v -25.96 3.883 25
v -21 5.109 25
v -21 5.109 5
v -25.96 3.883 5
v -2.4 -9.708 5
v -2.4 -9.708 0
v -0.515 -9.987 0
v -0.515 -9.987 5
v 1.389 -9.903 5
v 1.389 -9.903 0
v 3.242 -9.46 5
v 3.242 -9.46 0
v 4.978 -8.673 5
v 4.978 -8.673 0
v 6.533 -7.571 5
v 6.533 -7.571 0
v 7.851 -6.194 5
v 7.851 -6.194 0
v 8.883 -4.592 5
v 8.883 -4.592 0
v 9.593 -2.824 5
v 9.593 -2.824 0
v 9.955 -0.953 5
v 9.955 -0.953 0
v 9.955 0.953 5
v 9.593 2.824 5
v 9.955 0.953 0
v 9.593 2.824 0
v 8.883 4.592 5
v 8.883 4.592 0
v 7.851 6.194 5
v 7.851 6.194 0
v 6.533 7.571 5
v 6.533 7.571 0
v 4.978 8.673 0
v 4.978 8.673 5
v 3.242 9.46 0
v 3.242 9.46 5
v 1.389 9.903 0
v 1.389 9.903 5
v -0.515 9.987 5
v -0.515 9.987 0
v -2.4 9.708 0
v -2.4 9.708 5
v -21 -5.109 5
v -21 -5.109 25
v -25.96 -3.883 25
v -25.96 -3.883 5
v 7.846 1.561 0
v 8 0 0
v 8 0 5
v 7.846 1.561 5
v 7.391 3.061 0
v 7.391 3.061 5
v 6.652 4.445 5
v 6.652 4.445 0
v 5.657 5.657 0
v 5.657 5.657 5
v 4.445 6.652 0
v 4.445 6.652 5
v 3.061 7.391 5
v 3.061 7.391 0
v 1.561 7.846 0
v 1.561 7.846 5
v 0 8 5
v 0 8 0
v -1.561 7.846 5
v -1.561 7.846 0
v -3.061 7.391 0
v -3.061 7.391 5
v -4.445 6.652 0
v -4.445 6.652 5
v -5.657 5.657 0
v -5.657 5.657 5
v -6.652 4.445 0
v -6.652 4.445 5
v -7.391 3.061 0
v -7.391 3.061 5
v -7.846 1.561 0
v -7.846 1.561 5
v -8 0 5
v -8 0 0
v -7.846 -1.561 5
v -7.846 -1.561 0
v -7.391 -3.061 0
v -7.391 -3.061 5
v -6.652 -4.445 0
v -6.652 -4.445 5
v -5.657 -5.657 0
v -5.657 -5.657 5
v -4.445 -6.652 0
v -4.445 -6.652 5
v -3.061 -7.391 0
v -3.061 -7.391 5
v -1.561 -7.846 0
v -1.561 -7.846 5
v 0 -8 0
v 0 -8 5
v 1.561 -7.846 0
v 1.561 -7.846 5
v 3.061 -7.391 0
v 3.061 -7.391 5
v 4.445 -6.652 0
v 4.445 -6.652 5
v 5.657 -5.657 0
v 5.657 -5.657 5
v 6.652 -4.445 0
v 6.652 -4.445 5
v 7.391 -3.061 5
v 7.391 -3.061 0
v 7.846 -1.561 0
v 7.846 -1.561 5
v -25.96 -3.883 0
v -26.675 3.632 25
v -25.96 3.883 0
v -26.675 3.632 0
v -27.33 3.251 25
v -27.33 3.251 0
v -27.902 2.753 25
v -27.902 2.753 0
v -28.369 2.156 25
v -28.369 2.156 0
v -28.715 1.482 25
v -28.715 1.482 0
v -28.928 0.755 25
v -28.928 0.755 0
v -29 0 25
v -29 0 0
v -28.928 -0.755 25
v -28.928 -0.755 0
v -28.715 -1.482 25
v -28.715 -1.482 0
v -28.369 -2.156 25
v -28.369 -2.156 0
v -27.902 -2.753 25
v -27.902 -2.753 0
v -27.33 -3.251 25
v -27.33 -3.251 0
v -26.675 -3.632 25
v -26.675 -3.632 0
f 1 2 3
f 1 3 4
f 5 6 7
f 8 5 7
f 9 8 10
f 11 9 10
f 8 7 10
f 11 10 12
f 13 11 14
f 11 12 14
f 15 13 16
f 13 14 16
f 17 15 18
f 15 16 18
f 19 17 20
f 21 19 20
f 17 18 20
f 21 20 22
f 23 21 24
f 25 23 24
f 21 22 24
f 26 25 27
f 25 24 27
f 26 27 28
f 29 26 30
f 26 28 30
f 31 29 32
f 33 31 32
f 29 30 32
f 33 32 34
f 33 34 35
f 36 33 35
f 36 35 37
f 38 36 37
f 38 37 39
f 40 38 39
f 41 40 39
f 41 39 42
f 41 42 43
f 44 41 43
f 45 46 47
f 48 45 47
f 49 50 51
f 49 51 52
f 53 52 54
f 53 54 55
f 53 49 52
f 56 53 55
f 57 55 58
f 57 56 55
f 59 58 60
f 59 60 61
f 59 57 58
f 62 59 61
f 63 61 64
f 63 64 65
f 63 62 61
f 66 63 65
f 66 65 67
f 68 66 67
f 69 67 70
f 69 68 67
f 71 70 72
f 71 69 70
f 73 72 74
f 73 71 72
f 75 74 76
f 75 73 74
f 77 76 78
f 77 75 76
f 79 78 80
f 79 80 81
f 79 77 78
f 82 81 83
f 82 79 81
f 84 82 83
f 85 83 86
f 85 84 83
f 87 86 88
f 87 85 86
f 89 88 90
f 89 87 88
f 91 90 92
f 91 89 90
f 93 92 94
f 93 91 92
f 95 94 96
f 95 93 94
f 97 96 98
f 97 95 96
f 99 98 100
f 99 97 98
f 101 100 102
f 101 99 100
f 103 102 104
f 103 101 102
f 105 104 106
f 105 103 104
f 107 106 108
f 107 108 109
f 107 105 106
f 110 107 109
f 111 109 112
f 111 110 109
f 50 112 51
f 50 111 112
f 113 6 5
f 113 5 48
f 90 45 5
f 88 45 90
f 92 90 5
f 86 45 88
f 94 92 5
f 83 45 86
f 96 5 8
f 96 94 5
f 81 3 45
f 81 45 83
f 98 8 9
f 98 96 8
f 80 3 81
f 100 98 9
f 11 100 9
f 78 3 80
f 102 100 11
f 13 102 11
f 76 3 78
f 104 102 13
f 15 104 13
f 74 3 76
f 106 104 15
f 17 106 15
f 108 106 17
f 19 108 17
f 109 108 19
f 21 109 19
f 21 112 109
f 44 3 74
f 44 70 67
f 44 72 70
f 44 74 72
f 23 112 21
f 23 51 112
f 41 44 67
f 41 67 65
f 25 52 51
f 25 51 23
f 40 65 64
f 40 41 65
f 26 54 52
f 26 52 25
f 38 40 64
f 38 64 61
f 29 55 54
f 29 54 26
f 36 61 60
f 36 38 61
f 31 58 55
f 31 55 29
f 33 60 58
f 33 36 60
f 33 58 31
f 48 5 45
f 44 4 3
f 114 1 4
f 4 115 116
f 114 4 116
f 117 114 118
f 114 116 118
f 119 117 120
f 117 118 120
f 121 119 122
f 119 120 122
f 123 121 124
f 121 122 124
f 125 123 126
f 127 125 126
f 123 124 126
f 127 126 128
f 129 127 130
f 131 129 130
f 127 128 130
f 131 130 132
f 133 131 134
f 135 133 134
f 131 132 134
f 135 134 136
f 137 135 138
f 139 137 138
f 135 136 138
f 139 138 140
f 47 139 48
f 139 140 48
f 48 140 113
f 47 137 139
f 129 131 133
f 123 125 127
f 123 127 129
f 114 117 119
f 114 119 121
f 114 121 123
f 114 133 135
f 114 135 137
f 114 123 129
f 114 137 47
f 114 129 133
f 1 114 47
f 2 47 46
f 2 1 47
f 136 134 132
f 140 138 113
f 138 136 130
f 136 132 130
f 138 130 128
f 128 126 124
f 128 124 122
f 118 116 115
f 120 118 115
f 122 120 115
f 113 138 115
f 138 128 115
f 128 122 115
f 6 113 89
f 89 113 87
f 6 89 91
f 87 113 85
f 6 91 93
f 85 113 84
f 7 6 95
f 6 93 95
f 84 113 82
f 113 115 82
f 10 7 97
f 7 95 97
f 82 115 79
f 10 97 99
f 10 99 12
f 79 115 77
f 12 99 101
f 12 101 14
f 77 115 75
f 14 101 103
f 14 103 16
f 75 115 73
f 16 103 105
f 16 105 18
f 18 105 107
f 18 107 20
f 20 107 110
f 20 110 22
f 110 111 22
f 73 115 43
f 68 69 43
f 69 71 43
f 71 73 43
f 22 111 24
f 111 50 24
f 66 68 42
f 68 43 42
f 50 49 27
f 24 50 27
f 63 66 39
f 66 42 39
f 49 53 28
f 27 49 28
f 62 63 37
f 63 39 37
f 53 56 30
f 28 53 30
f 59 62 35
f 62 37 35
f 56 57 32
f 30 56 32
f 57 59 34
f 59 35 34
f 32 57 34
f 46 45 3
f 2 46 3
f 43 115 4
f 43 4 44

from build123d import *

# Parameters (mm, degrees)
SKETCH_R     = 8
PAD_DEPTH    = 5
PAD001_DEPTH = 20


with BuildPart() as part:
    # Sketch → Pad (new body)
    with BuildSketch(Plane.XY):
        with BuildLine():
            ThreePointArc((-2.4, -9.707729), (10, 0), (-2.4, 9.707729))
            Line((-25.96, 3.883092), (-2.4, 9.707729))
            ThreePointArc((-25.96, 3.883092), (-29, 0), (-25.96, -3.883092))
            Line((-2.4, -9.707729), (-25.96, -3.883092))
        make_face()
        Circle(SKETCH_R, mode=Mode.SUBTRACT)
    extrude(amount=PAD_DEPTH)

    # Sketch001 (on Face7 of Pad) → Pad001 (join)
    with BuildSketch(Plane.XY.offset(5)):
        with BuildLine():
            ThreePointArc((-25.96, 3.883092), (-29, 0), (-25.96, -3.883092))
            Line((-21, -5.109331), (-25.96, -3.883092))
            Line((-21, -5.109331), (-21, 5.109331))
            Line((-21, 5.109331), (-25.96, 3.883092))
        make_face()
    extrude(amount=PAD001_DEPTH)


solid = part.part
